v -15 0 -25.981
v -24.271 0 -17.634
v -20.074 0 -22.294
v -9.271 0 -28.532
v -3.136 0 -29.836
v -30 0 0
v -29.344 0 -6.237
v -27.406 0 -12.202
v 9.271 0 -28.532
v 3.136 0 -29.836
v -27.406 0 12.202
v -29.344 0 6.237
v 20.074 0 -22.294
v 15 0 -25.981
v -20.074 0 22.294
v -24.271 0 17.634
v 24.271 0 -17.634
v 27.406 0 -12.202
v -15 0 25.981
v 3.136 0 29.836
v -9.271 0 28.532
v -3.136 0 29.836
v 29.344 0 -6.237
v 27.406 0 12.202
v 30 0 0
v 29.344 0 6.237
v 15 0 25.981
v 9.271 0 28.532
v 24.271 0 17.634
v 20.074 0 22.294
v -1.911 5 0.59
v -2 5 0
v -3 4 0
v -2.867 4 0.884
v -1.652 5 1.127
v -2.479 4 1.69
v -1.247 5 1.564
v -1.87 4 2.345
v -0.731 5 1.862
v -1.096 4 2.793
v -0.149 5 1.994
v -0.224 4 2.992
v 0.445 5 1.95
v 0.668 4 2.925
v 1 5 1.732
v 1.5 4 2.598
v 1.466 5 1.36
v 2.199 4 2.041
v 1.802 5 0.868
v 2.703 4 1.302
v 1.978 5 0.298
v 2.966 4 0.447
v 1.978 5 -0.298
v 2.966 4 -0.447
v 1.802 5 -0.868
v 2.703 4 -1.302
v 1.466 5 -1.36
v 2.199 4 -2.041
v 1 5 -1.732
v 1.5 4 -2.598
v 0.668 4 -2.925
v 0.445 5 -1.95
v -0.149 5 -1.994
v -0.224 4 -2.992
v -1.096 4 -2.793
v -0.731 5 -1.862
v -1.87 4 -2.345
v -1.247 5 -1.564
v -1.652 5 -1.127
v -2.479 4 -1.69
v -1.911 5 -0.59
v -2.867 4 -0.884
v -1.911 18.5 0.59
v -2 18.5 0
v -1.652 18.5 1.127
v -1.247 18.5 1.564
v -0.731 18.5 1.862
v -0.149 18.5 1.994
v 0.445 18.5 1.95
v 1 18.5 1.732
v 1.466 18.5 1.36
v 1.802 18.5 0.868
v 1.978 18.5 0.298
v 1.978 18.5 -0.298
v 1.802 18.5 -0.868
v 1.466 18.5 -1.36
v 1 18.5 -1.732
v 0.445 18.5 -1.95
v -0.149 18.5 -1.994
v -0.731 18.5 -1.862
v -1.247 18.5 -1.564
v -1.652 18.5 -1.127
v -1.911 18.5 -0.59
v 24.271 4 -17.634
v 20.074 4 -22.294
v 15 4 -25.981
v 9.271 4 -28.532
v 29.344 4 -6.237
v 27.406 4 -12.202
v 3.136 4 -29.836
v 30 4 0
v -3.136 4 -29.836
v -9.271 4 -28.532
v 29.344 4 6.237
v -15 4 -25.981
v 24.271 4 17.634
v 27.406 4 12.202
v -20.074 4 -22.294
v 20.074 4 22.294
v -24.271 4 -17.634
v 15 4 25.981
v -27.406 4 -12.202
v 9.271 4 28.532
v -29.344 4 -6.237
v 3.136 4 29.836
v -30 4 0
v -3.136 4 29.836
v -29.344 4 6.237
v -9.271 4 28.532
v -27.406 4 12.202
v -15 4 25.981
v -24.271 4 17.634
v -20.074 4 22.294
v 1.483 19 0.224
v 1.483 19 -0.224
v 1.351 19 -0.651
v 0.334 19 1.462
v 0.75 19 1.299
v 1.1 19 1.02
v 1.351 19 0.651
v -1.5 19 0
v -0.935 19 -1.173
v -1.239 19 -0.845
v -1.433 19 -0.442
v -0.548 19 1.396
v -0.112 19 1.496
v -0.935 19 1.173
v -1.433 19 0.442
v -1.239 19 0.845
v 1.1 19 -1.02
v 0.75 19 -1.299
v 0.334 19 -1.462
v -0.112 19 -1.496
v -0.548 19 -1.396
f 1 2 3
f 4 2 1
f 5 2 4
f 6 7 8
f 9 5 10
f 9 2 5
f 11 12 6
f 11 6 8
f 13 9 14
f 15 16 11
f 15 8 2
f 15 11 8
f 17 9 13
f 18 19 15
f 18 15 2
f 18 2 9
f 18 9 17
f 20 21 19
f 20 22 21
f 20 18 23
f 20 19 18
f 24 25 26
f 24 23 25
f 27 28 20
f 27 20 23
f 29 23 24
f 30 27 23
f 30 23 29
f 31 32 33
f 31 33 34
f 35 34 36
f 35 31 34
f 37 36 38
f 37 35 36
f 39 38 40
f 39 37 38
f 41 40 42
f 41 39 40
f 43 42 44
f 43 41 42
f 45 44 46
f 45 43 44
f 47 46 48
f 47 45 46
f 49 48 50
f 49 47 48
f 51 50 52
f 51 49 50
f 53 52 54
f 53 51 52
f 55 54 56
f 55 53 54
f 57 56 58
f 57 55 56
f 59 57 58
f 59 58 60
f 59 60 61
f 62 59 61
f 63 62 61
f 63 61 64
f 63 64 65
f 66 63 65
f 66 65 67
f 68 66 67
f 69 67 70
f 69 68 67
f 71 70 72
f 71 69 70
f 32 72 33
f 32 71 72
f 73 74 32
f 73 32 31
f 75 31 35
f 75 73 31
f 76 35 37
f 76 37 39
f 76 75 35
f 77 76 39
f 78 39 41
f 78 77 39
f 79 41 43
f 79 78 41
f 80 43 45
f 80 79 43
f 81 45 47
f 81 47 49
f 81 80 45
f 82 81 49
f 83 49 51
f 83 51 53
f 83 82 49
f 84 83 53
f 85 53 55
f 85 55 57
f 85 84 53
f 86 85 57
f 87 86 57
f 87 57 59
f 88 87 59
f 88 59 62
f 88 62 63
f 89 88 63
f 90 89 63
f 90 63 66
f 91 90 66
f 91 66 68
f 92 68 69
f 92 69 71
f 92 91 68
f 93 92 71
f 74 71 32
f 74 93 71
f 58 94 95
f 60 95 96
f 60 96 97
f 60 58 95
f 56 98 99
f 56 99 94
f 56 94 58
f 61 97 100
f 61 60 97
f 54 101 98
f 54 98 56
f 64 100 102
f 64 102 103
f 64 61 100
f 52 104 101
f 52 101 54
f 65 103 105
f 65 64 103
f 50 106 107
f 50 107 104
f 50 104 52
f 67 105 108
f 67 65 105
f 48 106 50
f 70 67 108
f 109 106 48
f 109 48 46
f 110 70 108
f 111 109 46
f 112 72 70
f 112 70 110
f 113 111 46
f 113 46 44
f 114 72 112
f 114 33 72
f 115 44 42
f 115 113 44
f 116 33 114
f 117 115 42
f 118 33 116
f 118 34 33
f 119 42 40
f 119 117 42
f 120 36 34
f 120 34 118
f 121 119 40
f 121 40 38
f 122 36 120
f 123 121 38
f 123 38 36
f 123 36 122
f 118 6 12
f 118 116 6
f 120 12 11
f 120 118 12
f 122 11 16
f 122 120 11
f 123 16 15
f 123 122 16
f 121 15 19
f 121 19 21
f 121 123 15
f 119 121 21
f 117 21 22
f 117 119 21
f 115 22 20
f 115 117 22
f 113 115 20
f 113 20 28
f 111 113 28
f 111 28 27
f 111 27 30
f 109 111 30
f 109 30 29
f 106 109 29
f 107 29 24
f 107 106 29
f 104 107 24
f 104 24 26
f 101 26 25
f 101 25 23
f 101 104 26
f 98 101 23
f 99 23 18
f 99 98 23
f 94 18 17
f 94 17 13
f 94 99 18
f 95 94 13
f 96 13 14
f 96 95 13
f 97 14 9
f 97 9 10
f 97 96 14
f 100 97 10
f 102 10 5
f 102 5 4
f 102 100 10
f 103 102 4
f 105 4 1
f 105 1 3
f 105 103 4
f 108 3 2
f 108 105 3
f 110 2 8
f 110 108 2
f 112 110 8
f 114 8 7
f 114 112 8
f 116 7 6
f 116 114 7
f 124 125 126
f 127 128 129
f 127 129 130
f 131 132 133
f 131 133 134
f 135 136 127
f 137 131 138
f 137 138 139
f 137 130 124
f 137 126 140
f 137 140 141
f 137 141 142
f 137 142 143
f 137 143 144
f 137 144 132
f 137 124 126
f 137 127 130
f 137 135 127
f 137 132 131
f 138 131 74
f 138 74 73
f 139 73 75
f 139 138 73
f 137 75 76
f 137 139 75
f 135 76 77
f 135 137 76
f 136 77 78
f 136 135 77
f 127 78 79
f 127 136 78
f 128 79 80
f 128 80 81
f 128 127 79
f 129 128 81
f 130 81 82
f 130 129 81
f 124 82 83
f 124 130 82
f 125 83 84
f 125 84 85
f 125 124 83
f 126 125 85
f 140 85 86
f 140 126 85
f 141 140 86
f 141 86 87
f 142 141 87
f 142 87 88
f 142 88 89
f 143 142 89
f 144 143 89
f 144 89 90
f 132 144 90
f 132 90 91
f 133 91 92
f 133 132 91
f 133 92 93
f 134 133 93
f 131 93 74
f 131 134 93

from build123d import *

# Parameters (mm, degrees)
CHANFREIN1_SIZE = 1
CHANFREIN2_SIZE = 0.5


with BuildPart() as part:
    # Esquisse1 → Révolution1 (revolve)
    with BuildSketch(Plane.XY):
        Polygon((0, 0), (-30, 0), (-30, 4), (-2, 4), (-2, 19), (0, 19), align=None)
    revolve(axis=Axis((0, 0, 0), (0, 1, 0)))

    # Chanfrein1
    chanfrein1_edges = [part.edges().sort_by_distance(p)[0] for p in [
        (2, 4, 0),
    ]]
    chamfer(chanfrein1_edges, length=CHANFREIN1_SIZE)

    # Chanfrein2
    chanfrein2_edges = [part.edges().sort_by_distance(p)[0] for p in [
        (2, 19, 0),
    ]]
    chamfer(chanfrein2_edges, length=CHANFREIN2_SIZE)


solid = part.part
